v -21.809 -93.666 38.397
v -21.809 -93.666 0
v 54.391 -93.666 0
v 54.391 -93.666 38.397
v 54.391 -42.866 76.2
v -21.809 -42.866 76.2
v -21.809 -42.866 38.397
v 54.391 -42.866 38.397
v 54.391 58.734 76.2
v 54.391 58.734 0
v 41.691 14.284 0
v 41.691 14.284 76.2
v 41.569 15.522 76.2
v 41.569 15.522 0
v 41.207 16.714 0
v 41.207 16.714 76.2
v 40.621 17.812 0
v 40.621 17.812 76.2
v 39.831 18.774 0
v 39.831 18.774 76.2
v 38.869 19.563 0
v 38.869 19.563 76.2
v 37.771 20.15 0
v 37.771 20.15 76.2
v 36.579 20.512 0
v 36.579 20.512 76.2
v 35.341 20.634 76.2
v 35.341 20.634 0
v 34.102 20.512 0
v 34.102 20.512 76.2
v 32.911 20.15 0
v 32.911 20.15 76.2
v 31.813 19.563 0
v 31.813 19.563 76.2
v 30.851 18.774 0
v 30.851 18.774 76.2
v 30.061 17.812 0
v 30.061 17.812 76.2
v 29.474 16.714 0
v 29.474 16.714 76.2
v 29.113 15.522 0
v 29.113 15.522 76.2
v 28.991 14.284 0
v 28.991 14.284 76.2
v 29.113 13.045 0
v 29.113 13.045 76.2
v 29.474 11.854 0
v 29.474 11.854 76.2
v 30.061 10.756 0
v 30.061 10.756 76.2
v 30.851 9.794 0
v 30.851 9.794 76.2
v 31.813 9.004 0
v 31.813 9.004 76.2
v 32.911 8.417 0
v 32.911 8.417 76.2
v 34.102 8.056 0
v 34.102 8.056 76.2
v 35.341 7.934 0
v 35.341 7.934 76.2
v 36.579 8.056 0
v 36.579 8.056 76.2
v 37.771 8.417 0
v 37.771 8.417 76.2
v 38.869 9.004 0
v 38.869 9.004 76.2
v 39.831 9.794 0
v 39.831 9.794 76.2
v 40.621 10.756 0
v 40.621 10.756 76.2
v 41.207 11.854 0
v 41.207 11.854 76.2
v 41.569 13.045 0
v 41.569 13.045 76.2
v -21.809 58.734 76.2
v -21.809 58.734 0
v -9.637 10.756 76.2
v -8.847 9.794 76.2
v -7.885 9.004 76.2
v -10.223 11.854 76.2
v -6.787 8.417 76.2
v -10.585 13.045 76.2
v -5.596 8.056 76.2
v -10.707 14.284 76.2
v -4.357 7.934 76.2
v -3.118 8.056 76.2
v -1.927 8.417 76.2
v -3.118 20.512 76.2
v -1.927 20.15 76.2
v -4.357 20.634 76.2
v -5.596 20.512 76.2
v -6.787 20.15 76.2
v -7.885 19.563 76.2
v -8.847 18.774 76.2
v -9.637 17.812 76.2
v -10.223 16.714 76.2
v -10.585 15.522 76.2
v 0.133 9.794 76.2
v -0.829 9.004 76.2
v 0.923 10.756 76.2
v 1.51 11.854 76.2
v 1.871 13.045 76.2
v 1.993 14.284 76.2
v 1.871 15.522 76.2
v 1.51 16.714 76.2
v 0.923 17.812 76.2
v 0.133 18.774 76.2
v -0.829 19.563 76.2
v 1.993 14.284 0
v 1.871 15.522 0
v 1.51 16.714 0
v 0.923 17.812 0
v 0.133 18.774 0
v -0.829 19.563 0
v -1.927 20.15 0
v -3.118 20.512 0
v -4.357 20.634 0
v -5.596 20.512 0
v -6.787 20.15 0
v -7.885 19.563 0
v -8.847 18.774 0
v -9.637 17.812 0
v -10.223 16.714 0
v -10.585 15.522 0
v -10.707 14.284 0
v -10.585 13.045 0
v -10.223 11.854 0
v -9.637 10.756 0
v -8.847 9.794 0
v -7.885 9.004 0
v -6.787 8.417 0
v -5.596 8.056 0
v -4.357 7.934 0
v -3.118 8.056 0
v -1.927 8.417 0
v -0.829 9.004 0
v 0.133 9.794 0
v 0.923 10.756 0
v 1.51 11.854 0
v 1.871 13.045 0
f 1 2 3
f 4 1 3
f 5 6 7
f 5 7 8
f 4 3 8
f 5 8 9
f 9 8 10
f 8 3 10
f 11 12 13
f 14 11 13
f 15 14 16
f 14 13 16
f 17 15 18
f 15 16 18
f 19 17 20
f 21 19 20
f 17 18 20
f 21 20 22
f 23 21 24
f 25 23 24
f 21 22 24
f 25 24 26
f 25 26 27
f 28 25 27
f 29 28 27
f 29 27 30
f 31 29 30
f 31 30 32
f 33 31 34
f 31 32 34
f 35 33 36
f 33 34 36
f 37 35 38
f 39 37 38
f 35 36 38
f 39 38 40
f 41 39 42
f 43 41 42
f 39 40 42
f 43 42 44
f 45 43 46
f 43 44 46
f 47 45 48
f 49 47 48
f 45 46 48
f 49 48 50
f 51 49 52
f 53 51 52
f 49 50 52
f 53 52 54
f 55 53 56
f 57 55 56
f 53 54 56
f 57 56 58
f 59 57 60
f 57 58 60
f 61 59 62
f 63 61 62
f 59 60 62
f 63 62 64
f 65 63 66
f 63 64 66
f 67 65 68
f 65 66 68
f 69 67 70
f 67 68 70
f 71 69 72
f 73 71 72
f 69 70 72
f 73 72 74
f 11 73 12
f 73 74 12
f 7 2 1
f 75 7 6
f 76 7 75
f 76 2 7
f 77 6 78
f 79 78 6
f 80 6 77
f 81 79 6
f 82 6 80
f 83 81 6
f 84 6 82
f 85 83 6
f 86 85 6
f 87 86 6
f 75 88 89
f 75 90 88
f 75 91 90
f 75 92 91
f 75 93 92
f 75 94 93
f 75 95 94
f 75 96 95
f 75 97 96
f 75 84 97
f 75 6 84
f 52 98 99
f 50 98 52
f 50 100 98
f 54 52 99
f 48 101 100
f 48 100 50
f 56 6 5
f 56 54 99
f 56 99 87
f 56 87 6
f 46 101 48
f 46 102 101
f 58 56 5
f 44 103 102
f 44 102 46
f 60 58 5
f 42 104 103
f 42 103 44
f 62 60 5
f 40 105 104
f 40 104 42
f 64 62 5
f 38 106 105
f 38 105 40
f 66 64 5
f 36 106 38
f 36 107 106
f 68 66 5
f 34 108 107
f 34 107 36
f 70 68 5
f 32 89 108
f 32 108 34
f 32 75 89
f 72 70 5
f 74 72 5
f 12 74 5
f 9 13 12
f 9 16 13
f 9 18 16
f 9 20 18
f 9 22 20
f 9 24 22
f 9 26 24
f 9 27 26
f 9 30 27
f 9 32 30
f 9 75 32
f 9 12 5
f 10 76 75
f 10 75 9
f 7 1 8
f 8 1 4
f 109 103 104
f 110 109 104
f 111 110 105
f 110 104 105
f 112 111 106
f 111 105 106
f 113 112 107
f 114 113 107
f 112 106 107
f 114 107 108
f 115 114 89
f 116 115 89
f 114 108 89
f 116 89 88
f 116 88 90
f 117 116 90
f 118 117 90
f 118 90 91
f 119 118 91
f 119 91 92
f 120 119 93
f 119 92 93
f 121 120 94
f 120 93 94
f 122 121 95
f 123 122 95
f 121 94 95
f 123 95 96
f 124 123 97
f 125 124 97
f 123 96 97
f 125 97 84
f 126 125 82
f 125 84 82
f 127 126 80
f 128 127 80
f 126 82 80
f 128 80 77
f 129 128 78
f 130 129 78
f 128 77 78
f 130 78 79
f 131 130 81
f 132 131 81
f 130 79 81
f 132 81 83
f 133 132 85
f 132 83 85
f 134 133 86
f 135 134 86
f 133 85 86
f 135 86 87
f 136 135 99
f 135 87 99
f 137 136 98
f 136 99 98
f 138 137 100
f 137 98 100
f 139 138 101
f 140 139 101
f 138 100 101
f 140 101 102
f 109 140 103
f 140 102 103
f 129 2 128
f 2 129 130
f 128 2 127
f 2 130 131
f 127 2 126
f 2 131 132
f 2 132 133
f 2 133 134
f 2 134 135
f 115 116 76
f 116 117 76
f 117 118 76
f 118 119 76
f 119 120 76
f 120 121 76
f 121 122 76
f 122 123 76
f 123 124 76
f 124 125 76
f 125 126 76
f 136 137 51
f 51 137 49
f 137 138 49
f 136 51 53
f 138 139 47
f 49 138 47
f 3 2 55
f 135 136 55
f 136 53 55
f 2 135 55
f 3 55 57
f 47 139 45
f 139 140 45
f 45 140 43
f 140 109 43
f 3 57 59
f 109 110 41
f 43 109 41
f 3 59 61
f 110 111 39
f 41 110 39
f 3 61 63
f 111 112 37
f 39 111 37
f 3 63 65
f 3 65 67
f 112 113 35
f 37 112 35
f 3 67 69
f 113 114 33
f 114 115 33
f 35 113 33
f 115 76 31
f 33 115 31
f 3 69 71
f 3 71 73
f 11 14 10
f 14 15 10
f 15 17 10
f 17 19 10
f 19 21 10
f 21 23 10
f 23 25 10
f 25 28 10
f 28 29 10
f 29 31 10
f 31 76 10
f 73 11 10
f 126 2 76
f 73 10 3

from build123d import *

# Parameters (mm, degrees)
F0_W     = 76.2
F0_H     = 152.4
F1_DEPTH = 76.2
F2_R     = 6.35
F3_DEPTH = 76.2
F4_W     = 76.2
F4_H     = 38.1
F5_DEPTH = 25.4
F6_DEPTH = 50.8


with BuildPart() as f1:
    # F0 (on Top) → F1 (new body)
    with BuildSketch(Plane.XY):
        with Locations((16.290675, -17.46637)):
            Rectangle(F0_W, F0_H)
    extrude(amount=F1_DEPTH)

    # F2 (on face) → F3 (cut)
    with BuildSketch(Plane.XY.offset(76.2)):
        with Locations((-4.356702, 14.28363)):
            Circle(F2_R)
        with Locations((35.340675, 14.28363)):
            Circle(F2_R)
    extrude(amount=-F3_DEPTH, mode=Mode.SUBTRACT)

    # F4 (on face) → F5 (cut)
    with BuildSketch(Plane.XZ.offset(93.66637)):
        with Locations((16.290675, 57.446664)):
            Rectangle(F4_W, F4_H)
    extrude(amount=-F5_DEPTH, mode=Mode.SUBTRACT)

    # F4 (on face) → F6 (cut)
    with BuildSketch(Plane.XZ.offset(93.66637)):
        with Locations((16.290675, 57.446664)):
            Rectangle(F4_W, F4_H)
    extrude(amount=-F6_DEPTH, mode=Mode.SUBTRACT)


solid = f1.part
